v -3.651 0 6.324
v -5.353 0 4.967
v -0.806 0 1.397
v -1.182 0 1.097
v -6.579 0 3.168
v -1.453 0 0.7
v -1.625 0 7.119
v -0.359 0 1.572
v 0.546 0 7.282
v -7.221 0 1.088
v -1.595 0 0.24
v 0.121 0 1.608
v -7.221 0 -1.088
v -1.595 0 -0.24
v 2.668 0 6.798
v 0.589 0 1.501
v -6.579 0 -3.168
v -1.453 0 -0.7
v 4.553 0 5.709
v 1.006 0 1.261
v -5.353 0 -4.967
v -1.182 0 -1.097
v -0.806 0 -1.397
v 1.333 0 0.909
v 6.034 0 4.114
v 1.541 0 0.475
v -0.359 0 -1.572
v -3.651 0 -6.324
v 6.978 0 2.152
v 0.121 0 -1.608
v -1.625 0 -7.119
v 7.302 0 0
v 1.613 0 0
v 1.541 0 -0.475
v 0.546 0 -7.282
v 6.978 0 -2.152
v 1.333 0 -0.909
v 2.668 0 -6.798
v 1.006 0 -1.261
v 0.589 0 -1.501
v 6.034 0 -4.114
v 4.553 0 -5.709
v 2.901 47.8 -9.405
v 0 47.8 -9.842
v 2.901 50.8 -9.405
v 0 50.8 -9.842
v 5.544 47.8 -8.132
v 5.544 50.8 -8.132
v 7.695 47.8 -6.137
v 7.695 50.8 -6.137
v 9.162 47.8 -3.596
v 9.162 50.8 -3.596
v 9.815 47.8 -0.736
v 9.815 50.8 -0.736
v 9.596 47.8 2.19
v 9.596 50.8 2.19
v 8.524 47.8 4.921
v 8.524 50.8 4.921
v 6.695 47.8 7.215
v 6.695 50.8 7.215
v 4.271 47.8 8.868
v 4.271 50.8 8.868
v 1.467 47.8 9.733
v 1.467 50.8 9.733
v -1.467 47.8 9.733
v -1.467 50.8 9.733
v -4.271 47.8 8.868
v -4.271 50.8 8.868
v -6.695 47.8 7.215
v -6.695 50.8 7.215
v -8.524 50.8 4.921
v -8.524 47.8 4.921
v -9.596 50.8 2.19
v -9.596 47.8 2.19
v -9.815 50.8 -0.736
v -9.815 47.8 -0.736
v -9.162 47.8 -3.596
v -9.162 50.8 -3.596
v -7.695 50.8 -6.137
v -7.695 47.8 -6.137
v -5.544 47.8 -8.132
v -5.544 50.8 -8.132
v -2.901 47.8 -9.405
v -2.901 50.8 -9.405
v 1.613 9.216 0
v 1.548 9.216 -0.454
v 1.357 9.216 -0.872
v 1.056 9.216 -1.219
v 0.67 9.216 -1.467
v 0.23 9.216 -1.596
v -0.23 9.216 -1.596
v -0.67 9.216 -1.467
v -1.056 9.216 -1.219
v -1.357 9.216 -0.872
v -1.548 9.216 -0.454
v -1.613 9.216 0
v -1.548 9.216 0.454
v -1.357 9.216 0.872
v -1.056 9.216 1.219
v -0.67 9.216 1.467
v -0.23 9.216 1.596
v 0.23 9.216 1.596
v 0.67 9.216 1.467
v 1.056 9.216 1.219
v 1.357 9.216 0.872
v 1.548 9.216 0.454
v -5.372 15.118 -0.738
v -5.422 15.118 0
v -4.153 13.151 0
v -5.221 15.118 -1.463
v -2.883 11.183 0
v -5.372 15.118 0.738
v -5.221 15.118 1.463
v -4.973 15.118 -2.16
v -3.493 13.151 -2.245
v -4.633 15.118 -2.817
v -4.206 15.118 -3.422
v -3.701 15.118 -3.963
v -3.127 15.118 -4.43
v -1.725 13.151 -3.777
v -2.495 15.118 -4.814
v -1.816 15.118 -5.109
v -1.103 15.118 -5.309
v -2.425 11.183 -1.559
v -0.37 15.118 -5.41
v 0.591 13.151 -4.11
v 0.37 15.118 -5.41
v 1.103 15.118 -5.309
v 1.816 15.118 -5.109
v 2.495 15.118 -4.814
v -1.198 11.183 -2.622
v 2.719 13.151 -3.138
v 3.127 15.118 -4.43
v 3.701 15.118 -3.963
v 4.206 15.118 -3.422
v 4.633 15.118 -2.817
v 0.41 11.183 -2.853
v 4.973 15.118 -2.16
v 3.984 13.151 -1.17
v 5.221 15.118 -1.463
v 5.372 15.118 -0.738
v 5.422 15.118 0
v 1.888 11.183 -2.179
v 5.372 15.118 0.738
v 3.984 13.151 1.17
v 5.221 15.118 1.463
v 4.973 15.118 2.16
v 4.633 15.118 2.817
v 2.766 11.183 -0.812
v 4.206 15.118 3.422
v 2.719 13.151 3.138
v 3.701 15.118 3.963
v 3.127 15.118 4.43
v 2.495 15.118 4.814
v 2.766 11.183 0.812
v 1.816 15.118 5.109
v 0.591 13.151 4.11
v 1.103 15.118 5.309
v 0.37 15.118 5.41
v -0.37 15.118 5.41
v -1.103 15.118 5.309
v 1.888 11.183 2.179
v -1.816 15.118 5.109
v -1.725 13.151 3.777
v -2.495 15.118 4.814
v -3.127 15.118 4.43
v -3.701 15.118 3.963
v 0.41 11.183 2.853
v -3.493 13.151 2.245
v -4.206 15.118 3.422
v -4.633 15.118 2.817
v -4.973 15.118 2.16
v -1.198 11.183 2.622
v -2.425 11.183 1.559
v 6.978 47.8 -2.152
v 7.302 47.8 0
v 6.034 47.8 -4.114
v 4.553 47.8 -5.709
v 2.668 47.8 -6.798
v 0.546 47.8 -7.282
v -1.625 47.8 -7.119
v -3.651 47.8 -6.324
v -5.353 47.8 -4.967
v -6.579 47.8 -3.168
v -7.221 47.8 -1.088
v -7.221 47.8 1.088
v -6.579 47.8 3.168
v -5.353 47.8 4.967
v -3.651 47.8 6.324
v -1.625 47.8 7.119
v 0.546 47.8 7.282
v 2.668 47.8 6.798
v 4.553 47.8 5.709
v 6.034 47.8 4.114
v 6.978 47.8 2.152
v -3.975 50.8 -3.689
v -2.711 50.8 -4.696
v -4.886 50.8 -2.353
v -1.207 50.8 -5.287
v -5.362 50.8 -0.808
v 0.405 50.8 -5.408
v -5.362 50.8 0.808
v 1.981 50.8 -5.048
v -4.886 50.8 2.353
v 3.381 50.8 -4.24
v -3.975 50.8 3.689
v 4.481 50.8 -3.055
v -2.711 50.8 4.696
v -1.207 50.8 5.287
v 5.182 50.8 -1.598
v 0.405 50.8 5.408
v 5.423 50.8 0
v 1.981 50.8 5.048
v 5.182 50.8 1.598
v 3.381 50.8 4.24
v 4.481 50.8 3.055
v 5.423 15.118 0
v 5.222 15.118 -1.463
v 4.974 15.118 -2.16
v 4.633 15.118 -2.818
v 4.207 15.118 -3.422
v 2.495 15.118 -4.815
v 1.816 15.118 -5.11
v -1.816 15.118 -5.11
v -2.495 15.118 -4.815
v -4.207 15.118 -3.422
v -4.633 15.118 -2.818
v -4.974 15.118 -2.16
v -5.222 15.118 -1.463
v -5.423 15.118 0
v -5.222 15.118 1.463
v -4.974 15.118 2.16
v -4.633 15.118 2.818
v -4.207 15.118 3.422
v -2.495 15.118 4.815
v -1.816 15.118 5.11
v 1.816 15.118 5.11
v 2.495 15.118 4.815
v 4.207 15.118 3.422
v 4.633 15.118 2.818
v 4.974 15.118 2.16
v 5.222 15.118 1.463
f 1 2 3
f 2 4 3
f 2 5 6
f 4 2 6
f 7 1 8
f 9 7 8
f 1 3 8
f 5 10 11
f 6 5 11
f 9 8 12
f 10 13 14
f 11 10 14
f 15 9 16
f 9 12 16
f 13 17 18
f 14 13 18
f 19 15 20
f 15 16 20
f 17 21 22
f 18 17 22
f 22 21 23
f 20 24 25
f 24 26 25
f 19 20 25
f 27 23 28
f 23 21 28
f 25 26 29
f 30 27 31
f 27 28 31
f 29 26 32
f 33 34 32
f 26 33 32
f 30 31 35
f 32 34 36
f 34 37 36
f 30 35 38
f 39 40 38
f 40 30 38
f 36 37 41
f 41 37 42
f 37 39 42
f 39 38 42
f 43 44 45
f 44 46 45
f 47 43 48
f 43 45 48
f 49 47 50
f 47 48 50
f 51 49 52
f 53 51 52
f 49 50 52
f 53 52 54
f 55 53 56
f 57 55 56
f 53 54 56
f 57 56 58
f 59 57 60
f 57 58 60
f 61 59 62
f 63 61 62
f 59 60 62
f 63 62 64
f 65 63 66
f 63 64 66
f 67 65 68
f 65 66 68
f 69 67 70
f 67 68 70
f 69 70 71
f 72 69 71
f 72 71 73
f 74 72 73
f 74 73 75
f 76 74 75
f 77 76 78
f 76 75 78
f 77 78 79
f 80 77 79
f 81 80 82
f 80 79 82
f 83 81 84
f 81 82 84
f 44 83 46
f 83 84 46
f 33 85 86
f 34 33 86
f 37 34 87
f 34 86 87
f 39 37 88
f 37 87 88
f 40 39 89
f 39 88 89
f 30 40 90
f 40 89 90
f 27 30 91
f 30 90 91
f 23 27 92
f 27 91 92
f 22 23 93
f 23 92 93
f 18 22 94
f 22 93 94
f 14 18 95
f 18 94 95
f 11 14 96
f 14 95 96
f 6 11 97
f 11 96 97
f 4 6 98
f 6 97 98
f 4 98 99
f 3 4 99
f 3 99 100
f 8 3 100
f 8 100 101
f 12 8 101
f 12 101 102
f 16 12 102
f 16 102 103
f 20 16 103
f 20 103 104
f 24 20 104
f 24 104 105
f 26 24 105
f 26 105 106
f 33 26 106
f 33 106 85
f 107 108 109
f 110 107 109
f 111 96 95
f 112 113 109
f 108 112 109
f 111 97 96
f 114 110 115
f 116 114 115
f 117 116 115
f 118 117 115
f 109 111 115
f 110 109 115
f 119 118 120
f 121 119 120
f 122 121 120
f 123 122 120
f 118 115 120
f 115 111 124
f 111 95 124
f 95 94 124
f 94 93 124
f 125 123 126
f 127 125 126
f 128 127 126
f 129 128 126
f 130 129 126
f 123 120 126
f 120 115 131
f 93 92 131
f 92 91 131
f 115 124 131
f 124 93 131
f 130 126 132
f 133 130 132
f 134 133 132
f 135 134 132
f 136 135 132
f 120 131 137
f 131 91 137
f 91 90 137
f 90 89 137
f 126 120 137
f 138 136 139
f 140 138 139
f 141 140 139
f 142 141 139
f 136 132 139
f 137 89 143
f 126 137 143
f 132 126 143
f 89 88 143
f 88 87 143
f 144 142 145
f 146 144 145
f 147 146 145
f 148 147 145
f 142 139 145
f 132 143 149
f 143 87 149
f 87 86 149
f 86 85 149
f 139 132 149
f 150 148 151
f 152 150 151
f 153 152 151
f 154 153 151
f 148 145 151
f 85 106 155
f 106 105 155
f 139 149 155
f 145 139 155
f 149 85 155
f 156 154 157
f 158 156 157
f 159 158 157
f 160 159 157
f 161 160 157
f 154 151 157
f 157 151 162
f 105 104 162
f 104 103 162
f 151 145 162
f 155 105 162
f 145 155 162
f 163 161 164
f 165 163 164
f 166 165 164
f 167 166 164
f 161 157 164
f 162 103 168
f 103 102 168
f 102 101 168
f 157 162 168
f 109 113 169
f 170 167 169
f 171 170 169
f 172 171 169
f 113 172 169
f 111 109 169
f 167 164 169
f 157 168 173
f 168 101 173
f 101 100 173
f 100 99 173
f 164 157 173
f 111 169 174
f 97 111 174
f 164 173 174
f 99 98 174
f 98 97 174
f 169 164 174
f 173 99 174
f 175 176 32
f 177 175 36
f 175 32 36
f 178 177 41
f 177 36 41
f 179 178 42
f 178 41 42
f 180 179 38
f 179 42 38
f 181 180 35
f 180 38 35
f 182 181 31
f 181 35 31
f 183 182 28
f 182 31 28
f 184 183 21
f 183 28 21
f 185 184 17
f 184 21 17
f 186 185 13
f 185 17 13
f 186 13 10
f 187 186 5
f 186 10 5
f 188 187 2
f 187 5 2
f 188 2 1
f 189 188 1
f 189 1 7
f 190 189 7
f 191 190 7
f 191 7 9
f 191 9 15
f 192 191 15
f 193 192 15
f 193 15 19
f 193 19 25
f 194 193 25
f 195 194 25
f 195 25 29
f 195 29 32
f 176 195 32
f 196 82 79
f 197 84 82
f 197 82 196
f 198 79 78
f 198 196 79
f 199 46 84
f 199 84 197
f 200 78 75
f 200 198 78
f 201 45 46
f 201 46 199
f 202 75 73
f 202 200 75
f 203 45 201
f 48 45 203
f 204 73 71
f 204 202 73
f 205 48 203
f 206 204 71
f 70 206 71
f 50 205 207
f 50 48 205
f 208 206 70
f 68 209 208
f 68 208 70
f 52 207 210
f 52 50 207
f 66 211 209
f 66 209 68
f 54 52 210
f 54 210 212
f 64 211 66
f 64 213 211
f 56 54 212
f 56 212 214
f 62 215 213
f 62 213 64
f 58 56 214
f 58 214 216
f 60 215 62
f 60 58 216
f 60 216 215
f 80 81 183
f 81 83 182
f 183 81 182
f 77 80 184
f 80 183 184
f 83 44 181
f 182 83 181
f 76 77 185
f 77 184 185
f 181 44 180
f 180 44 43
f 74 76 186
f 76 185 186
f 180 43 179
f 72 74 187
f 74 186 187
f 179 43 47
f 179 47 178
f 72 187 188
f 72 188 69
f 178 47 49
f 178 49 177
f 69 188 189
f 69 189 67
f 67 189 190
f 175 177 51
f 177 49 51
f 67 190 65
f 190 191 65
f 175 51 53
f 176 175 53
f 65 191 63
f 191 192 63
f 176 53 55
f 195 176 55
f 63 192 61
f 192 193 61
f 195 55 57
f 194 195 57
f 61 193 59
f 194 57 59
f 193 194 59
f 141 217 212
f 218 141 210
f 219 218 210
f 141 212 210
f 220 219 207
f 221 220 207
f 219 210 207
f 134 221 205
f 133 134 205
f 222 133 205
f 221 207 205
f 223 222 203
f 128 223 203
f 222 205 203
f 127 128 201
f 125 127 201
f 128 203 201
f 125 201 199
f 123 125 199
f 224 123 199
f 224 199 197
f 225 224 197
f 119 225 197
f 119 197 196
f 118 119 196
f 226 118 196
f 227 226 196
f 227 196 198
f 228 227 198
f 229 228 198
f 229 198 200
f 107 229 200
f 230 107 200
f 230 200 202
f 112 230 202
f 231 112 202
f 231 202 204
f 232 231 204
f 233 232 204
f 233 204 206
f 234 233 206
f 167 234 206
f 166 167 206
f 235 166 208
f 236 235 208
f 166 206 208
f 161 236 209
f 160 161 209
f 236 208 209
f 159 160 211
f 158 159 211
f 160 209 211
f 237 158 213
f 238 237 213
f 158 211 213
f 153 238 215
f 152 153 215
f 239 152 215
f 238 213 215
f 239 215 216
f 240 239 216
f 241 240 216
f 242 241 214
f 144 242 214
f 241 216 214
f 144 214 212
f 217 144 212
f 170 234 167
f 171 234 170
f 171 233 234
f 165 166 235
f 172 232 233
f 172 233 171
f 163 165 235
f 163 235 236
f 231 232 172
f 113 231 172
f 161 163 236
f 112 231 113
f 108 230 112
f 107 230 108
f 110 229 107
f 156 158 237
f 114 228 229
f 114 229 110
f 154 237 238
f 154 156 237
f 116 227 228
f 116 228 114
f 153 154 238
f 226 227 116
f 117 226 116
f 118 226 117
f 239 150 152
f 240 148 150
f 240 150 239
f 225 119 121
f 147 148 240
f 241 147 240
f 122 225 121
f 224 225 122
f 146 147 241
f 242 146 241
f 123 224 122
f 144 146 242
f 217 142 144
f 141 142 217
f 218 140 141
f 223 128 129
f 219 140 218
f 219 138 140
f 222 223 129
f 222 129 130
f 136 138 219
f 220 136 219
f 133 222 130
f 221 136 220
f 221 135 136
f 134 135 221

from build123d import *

# Parameters (mm, degrees)
SKETCH1_R           = 7.3025
BOSS_EXTRUDE1_DEPTH = 50.8
SKETCH2_R           = 1.6129
CUT_EXTRUDE1_DEPTH  = 50.8
SKETCH5_W           = 2.54
SKETCH5_H           = 3
SKETCH6_R           = 5.4229
CUT_EXTRUDE3_DEPTH  = 35.68192


with BuildPart() as part:
    # Sketch1 → Boss-Extrude1 (new body)
    with BuildSketch(Plane(origin=(0, 0, 0), x_dir=(1, 0, 0), z_dir=(0, 1, 0))):
        Circle(SKETCH1_R)
    extrude(amount=BOSS_EXTRUDE1_DEPTH)

    # Sketch2 → Cut-Extrude1 (cut)
    with BuildSketch(Plane(origin=(0, 50.8, 0), x_dir=(1, 0, 0), z_dir=(0, 1, 0))):
        Circle(SKETCH2_R)
    extrude(amount=-CUT_EXTRUDE1_DEPTH, mode=Mode.SUBTRACT)

    # Sketch3 → Cut-Revolve1 (revolve, cut)
    with BuildSketch(Plane.XY):
        Polygon((-5.4229, 15.118959148), (-1.6129, 9.215668113), (-1.6129, 15.118959148), align=None)
    revolve(axis=Axis((0, 34.671, 0), (0, -1, 0)), mode=Mode.SUBTRACT)

    # Sketch5 → Revolve1 (revolve)
    with BuildSketch(Plane(origin=(0, 0, 0), x_dir=(0, 0, -1), z_dir=(1, 0, 0))):
        with Locations((8.5725, 49.3)):
            Rectangle(SKETCH5_W, SKETCH5_H)
    revolve(axis=Axis((0, 34.671, 0), (0, -1, 0)))

    # Sketch6 → Cut-Extrude3 (cut)
    with BuildSketch(Plane(origin=(0, 50.8, 0), x_dir=(1, 0, 0), z_dir=(0, 1, 0))):
        Circle(SKETCH6_R)
    extrude(amount=-CUT_EXTRUDE3_DEPTH, mode=Mode.SUBTRACT)


solid = part.part
